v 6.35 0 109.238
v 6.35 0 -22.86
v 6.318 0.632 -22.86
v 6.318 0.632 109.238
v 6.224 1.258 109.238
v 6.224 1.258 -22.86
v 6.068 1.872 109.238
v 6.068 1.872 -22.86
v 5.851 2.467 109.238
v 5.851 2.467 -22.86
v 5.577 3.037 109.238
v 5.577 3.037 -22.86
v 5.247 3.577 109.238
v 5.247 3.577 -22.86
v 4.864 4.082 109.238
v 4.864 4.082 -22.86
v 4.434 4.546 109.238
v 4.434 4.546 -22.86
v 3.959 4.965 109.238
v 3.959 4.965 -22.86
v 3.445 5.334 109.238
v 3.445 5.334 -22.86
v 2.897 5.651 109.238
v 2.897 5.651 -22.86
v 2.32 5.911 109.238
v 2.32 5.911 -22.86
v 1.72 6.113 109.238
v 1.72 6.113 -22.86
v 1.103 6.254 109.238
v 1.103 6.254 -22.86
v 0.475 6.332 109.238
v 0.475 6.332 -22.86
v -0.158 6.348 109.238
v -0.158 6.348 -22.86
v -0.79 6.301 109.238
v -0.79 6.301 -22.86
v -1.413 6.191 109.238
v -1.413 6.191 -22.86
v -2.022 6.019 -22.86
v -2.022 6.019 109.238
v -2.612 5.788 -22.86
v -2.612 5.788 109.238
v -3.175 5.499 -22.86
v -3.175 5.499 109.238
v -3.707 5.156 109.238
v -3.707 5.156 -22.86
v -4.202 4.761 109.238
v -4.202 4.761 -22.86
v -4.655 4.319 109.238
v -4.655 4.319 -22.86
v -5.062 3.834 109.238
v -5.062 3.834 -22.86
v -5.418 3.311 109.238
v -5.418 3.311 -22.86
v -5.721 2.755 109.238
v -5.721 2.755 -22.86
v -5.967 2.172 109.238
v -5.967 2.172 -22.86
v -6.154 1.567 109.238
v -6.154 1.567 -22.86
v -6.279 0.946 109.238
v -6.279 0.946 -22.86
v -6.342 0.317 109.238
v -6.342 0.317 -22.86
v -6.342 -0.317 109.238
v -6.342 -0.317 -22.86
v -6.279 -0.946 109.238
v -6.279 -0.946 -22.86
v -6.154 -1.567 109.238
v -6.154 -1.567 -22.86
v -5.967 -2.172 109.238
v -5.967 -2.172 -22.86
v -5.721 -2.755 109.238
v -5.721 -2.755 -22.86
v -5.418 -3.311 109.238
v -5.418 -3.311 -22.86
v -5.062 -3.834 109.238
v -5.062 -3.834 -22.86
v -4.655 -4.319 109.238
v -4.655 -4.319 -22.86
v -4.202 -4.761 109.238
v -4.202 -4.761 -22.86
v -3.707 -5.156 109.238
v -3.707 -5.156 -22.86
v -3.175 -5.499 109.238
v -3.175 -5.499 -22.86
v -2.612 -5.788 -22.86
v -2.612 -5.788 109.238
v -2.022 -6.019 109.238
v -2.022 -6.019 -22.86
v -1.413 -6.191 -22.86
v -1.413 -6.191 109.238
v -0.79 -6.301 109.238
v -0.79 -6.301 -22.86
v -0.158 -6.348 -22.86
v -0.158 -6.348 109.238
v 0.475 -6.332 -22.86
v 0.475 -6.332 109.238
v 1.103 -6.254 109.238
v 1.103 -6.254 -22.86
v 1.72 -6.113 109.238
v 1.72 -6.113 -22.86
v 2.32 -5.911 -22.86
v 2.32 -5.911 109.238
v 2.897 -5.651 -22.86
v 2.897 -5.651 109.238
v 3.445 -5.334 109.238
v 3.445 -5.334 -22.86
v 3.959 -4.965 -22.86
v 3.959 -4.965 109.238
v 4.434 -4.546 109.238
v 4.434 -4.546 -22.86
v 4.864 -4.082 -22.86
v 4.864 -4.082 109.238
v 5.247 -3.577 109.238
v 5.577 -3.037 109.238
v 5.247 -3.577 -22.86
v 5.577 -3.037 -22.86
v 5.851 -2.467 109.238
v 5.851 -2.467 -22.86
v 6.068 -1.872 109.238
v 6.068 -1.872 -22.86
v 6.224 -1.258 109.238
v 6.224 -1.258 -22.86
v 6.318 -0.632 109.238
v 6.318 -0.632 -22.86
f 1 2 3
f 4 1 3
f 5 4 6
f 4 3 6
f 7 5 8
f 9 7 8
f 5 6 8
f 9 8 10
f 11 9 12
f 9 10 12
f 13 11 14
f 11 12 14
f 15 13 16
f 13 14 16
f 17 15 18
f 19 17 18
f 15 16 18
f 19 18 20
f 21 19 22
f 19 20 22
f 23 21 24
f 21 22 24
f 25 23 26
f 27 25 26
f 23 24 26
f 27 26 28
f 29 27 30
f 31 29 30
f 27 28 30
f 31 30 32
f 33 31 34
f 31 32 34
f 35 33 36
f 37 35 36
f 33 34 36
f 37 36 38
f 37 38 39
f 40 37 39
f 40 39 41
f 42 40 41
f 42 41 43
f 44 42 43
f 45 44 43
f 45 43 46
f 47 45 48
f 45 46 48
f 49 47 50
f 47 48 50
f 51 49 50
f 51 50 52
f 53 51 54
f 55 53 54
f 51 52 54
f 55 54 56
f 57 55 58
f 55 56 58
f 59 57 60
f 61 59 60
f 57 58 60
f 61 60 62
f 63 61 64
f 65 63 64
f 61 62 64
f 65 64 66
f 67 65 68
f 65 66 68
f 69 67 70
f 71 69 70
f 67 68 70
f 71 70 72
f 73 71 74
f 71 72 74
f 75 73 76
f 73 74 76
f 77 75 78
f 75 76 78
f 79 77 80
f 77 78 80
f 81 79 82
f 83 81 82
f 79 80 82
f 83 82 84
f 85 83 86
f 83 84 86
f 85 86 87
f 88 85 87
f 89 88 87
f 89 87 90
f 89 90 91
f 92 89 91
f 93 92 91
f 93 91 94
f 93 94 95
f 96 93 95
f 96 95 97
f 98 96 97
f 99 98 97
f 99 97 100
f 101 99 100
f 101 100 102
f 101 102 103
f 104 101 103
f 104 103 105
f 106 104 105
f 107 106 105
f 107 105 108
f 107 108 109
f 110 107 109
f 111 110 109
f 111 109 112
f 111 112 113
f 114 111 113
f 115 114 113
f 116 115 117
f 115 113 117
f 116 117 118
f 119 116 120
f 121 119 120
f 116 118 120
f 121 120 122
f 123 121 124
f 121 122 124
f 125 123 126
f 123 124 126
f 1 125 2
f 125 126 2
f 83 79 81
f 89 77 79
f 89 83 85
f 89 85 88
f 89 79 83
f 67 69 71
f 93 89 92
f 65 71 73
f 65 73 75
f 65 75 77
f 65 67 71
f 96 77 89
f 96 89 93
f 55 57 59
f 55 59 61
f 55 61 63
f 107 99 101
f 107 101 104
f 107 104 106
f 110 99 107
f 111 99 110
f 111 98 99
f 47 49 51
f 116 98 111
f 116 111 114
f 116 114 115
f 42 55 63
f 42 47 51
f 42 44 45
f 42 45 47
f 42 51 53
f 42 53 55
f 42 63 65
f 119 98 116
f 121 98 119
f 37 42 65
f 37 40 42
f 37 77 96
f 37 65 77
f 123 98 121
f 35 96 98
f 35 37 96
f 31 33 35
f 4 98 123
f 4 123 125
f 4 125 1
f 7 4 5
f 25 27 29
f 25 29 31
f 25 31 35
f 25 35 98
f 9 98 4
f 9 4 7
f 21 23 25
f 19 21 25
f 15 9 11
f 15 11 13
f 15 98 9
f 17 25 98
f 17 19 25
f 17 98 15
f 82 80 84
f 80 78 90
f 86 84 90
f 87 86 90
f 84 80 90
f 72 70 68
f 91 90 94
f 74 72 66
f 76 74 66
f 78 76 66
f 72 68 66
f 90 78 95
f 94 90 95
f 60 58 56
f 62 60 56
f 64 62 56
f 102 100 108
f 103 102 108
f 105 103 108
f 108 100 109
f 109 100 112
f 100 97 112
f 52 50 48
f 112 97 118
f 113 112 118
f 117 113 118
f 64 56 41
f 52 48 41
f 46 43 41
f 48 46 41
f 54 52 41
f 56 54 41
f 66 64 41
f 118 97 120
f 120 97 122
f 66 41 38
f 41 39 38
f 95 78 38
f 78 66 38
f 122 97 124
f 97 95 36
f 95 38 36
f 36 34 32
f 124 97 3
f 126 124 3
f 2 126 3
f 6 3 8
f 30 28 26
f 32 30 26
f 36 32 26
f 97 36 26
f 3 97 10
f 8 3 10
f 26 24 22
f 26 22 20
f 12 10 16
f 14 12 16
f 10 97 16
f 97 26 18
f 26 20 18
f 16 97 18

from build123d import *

# Parameters (mm, degrees)
BOSS_EXTRUDE1_OUTLINE_R = 6.35
BOSS_EXTRUDE1_DEPTH     = 132.09778


# Read off the part's stored shape, not the designer's step: Boss-Extrude1
with BuildPart() as part:
    # Boss-Extrude1 outline → Boss-Extrude1 (new body)
    with BuildSketch(Plane.XY.offset(-22.86)):
        Circle(BOSS_EXTRUDE1_OUTLINE_R)
    extrude(amount=BOSS_EXTRUDE1_DEPTH)


solid = part.part
